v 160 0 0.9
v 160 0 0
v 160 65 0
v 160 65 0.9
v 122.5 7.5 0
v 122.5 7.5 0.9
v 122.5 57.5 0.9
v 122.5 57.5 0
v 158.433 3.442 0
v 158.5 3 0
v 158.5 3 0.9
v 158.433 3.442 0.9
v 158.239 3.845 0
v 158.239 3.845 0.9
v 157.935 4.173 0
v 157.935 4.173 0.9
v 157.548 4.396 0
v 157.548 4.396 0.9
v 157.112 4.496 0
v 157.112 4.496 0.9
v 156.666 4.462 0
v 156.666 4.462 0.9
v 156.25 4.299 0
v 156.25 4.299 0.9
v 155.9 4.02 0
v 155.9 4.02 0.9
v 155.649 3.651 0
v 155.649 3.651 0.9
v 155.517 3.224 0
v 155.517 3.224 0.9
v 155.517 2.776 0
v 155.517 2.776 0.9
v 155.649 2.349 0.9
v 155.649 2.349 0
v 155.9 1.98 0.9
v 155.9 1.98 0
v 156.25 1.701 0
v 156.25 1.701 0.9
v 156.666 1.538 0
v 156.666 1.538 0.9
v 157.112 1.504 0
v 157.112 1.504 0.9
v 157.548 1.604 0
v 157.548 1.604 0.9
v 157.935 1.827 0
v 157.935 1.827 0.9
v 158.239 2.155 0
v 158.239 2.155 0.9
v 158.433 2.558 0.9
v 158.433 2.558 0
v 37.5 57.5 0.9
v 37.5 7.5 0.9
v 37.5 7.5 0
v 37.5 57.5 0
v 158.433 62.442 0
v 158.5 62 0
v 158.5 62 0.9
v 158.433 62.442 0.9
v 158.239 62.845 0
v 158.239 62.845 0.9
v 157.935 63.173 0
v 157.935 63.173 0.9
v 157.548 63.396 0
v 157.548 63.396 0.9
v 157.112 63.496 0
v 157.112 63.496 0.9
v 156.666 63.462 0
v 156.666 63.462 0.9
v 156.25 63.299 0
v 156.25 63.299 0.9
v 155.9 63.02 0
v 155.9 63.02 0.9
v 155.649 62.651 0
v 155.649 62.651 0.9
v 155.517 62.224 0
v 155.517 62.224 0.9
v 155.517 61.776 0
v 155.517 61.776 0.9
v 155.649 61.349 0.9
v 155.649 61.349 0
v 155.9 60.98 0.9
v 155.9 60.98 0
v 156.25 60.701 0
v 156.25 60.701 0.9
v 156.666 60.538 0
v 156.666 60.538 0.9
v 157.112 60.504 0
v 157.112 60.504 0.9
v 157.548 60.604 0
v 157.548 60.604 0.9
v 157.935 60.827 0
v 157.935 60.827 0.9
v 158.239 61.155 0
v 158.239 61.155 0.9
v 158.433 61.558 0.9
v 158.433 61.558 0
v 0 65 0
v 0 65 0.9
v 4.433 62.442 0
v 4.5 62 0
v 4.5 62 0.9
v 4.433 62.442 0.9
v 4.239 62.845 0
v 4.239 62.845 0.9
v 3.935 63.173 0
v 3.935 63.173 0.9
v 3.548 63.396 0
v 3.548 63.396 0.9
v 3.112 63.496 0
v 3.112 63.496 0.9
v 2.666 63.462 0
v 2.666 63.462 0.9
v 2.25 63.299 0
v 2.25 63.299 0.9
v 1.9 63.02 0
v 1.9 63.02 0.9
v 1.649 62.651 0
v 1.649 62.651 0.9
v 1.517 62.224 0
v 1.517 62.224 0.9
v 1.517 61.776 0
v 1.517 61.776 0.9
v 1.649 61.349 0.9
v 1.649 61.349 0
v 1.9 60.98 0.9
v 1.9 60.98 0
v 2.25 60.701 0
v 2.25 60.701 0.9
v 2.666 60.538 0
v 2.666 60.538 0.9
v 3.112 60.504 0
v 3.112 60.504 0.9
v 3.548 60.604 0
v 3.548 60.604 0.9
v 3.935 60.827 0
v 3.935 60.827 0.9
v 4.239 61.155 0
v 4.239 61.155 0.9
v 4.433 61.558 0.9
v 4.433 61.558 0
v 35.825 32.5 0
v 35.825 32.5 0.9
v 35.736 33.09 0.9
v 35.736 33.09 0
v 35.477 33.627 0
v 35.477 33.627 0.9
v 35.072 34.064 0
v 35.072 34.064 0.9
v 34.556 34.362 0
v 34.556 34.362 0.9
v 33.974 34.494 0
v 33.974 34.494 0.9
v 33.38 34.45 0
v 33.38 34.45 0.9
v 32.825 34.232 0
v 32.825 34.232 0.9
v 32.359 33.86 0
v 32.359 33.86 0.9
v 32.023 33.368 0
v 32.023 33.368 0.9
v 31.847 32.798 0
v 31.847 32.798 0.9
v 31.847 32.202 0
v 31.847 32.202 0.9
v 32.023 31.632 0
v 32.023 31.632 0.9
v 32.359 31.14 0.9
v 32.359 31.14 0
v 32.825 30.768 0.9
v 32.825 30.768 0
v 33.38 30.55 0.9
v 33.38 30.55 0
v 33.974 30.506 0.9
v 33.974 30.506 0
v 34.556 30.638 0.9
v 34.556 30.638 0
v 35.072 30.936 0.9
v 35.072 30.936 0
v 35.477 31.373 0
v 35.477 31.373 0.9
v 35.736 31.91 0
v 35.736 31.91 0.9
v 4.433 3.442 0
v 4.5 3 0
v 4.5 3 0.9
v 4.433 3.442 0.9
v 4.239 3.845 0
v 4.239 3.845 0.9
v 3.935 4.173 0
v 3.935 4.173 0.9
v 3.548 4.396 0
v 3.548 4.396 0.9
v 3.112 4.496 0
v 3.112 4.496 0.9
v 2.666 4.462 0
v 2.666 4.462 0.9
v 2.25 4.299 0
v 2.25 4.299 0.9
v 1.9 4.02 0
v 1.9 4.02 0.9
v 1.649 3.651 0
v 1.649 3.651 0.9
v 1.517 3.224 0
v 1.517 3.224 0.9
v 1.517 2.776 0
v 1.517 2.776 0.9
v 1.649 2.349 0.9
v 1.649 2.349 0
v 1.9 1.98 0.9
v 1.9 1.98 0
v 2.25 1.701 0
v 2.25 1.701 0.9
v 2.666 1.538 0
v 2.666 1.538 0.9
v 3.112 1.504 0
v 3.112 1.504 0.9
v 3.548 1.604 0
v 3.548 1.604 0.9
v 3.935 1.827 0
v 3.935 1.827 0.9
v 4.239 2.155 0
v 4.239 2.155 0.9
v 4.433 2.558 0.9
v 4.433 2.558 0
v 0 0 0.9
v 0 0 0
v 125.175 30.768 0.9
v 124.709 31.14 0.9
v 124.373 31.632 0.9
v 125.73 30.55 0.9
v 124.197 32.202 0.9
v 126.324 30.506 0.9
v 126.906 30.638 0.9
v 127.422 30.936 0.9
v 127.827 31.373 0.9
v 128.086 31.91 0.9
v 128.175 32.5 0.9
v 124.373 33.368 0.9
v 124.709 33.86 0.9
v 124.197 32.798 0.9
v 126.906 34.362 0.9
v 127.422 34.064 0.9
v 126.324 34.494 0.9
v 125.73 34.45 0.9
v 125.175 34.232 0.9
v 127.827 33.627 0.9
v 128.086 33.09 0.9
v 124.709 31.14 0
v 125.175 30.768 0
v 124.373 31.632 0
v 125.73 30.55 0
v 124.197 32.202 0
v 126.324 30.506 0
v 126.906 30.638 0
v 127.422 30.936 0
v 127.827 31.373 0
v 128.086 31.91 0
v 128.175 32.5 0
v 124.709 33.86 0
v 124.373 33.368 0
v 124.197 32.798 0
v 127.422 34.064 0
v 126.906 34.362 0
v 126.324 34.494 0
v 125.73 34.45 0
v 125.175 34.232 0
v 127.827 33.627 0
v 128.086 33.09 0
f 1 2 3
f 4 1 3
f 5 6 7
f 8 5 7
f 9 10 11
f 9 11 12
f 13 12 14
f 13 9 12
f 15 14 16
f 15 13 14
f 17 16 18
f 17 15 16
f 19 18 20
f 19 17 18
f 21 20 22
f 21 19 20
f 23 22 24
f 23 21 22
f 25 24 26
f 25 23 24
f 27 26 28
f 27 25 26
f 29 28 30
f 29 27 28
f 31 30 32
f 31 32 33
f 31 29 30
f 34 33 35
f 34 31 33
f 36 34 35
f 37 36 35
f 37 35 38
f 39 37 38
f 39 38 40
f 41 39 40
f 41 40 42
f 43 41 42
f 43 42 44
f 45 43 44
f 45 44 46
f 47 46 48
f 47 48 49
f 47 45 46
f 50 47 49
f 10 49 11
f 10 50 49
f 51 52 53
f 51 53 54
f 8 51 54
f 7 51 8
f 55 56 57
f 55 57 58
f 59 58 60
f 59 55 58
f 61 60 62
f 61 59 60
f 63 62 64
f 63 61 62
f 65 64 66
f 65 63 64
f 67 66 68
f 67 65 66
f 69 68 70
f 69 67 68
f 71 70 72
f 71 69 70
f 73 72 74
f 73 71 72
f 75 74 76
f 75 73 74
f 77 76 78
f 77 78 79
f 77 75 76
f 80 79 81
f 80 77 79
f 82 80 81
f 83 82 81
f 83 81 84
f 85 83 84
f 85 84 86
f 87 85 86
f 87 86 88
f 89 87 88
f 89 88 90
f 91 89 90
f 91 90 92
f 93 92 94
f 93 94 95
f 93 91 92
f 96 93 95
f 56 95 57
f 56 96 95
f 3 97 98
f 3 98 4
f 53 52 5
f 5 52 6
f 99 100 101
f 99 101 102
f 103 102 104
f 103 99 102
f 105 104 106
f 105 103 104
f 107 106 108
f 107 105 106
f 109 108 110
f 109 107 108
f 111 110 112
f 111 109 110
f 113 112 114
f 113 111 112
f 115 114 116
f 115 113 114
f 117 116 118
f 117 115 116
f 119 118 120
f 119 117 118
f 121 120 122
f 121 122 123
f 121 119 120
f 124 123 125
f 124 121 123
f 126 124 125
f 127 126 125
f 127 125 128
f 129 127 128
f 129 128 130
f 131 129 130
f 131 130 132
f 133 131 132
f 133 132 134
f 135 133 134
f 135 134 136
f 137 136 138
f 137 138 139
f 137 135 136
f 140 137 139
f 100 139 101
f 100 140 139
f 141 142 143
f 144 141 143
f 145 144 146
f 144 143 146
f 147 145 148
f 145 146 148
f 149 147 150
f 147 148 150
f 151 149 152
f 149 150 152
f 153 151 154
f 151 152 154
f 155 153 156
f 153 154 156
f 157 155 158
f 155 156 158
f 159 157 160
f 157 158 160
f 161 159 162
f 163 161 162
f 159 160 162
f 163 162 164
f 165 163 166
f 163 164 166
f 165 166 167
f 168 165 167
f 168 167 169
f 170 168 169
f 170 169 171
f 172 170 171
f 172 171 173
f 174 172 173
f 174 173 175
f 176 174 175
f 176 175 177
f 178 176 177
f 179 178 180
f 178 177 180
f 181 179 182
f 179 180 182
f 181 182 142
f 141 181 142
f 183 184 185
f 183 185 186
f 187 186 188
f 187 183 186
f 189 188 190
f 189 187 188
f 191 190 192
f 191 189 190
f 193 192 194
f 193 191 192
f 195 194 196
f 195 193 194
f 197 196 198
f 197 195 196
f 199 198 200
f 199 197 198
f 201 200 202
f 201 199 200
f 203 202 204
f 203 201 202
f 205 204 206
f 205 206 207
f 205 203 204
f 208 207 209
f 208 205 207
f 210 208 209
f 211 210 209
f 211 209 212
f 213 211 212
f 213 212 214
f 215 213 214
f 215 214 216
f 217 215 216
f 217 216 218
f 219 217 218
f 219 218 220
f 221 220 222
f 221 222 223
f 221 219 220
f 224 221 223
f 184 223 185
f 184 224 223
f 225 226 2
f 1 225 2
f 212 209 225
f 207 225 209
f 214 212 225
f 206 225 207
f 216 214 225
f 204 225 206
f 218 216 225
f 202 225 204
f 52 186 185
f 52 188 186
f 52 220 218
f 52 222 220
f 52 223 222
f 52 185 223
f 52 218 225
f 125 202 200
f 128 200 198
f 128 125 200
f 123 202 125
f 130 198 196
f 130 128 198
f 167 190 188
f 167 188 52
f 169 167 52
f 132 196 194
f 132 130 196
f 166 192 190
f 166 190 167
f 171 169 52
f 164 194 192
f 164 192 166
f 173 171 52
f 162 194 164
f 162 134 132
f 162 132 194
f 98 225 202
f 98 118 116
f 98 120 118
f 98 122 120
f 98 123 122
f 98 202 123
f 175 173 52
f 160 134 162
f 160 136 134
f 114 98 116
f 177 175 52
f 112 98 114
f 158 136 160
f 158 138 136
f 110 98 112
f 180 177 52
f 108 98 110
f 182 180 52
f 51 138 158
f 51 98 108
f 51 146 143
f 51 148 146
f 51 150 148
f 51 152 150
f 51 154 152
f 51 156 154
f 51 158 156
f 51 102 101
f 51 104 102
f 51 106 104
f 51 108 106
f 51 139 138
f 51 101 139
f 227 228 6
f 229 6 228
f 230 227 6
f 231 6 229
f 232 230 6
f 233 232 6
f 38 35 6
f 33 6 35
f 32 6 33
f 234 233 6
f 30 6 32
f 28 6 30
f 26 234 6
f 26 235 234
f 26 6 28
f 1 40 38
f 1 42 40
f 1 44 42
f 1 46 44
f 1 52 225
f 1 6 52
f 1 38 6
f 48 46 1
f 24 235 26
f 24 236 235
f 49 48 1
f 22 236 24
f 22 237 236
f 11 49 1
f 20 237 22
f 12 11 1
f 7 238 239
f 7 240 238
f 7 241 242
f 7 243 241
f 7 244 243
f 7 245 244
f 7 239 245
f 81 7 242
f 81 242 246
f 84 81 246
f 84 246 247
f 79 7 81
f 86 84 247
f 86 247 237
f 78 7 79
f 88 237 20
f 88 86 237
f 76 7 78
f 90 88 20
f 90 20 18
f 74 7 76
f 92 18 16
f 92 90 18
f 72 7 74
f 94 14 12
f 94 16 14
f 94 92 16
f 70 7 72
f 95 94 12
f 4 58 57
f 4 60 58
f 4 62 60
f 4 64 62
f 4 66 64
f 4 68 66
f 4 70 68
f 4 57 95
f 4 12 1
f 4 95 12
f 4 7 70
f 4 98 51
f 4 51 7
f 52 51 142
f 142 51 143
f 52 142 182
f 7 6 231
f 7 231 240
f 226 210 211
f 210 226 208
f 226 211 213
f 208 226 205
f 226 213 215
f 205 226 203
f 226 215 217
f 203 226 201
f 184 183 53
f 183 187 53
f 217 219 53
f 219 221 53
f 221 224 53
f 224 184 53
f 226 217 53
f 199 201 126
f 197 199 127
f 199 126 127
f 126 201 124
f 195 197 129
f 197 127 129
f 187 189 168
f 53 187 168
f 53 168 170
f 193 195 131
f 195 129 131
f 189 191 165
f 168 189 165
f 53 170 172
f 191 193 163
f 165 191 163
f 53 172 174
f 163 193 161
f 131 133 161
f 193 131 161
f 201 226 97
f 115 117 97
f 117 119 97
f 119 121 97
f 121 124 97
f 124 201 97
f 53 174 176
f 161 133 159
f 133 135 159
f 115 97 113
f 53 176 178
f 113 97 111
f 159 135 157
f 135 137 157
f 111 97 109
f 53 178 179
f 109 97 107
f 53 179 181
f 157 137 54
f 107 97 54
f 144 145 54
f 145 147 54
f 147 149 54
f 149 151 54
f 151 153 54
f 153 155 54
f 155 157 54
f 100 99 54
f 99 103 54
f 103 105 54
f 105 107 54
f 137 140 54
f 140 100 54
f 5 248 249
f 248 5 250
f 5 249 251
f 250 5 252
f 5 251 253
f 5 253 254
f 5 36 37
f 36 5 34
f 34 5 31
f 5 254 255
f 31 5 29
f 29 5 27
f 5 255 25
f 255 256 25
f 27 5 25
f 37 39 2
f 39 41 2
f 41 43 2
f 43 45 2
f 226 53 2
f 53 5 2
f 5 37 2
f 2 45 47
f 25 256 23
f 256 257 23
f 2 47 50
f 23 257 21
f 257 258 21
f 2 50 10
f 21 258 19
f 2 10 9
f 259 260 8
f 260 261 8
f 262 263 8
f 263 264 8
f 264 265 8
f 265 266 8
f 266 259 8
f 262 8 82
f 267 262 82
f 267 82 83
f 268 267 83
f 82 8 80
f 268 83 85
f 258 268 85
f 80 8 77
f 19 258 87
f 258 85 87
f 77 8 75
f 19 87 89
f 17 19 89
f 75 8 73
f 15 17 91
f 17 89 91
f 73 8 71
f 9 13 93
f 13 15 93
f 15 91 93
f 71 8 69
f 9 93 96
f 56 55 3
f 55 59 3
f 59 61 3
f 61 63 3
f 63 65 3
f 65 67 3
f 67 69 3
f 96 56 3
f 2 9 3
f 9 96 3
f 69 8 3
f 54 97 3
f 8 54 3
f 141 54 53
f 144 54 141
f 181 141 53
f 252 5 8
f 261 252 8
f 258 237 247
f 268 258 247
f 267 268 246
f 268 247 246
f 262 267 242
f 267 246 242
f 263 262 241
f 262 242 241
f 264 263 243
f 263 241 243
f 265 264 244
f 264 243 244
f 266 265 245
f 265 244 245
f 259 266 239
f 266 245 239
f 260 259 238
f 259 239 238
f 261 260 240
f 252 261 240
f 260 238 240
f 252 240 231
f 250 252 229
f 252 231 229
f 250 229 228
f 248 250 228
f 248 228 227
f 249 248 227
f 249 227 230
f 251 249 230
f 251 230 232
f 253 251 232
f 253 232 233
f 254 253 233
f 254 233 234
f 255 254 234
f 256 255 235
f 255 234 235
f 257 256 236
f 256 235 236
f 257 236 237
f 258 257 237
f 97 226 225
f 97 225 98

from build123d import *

# Parameters (mm, degrees)
ESQUISSE1_W             = 160
ESQUISSE1_H             = 65
ESQUISSE1_R             = 1.5
BOSS_EXTRU_1_DEPTH      = 0.9
ESQUISSE2_R             = 2
ESQUISSE2_W             = 85
ESQUISSE2_H             = 50
ENL_V_MAT_EXTRU_1_DEPTH = 0.9


with BuildPart() as part:
    # Esquisse1 → Boss.-Extru.1 (new body)
    with BuildSketch(Plane.XY):
        with Locations((80, 32.5)):
            Rectangle(ESQUISSE1_W, ESQUISSE1_H)
        with Locations((3, 62)):
            Circle(ESQUISSE1_R, mode=Mode.SUBTRACT)
        with Locations((3, 3)):
            Circle(ESQUISSE1_R, mode=Mode.SUBTRACT)
        with Locations((157, 3)):
            Circle(ESQUISSE1_R, mode=Mode.SUBTRACT)
        with Locations((157, 62)):
            Circle(ESQUISSE1_R, mode=Mode.SUBTRACT)
    extrude(amount=BOSS_EXTRU_1_DEPTH)

    # Esquisse2 → Enlèv. mat.-Extru.1 (cut)
    with BuildSketch(Plane.XY.offset(0.9)):
        with Locations((33.825, 32.5)):
            Circle(ESQUISSE2_R)
        with Locations((126.175, 32.5)):
            Circle(ESQUISSE2_R)
        with Locations((80, 32.5)):
            Rectangle(ESQUISSE2_W, ESQUISSE2_H)
    extrude(amount=-ENL_V_MAT_EXTRU_1_DEPTH, mode=Mode.SUBTRACT)


solid = part.part
